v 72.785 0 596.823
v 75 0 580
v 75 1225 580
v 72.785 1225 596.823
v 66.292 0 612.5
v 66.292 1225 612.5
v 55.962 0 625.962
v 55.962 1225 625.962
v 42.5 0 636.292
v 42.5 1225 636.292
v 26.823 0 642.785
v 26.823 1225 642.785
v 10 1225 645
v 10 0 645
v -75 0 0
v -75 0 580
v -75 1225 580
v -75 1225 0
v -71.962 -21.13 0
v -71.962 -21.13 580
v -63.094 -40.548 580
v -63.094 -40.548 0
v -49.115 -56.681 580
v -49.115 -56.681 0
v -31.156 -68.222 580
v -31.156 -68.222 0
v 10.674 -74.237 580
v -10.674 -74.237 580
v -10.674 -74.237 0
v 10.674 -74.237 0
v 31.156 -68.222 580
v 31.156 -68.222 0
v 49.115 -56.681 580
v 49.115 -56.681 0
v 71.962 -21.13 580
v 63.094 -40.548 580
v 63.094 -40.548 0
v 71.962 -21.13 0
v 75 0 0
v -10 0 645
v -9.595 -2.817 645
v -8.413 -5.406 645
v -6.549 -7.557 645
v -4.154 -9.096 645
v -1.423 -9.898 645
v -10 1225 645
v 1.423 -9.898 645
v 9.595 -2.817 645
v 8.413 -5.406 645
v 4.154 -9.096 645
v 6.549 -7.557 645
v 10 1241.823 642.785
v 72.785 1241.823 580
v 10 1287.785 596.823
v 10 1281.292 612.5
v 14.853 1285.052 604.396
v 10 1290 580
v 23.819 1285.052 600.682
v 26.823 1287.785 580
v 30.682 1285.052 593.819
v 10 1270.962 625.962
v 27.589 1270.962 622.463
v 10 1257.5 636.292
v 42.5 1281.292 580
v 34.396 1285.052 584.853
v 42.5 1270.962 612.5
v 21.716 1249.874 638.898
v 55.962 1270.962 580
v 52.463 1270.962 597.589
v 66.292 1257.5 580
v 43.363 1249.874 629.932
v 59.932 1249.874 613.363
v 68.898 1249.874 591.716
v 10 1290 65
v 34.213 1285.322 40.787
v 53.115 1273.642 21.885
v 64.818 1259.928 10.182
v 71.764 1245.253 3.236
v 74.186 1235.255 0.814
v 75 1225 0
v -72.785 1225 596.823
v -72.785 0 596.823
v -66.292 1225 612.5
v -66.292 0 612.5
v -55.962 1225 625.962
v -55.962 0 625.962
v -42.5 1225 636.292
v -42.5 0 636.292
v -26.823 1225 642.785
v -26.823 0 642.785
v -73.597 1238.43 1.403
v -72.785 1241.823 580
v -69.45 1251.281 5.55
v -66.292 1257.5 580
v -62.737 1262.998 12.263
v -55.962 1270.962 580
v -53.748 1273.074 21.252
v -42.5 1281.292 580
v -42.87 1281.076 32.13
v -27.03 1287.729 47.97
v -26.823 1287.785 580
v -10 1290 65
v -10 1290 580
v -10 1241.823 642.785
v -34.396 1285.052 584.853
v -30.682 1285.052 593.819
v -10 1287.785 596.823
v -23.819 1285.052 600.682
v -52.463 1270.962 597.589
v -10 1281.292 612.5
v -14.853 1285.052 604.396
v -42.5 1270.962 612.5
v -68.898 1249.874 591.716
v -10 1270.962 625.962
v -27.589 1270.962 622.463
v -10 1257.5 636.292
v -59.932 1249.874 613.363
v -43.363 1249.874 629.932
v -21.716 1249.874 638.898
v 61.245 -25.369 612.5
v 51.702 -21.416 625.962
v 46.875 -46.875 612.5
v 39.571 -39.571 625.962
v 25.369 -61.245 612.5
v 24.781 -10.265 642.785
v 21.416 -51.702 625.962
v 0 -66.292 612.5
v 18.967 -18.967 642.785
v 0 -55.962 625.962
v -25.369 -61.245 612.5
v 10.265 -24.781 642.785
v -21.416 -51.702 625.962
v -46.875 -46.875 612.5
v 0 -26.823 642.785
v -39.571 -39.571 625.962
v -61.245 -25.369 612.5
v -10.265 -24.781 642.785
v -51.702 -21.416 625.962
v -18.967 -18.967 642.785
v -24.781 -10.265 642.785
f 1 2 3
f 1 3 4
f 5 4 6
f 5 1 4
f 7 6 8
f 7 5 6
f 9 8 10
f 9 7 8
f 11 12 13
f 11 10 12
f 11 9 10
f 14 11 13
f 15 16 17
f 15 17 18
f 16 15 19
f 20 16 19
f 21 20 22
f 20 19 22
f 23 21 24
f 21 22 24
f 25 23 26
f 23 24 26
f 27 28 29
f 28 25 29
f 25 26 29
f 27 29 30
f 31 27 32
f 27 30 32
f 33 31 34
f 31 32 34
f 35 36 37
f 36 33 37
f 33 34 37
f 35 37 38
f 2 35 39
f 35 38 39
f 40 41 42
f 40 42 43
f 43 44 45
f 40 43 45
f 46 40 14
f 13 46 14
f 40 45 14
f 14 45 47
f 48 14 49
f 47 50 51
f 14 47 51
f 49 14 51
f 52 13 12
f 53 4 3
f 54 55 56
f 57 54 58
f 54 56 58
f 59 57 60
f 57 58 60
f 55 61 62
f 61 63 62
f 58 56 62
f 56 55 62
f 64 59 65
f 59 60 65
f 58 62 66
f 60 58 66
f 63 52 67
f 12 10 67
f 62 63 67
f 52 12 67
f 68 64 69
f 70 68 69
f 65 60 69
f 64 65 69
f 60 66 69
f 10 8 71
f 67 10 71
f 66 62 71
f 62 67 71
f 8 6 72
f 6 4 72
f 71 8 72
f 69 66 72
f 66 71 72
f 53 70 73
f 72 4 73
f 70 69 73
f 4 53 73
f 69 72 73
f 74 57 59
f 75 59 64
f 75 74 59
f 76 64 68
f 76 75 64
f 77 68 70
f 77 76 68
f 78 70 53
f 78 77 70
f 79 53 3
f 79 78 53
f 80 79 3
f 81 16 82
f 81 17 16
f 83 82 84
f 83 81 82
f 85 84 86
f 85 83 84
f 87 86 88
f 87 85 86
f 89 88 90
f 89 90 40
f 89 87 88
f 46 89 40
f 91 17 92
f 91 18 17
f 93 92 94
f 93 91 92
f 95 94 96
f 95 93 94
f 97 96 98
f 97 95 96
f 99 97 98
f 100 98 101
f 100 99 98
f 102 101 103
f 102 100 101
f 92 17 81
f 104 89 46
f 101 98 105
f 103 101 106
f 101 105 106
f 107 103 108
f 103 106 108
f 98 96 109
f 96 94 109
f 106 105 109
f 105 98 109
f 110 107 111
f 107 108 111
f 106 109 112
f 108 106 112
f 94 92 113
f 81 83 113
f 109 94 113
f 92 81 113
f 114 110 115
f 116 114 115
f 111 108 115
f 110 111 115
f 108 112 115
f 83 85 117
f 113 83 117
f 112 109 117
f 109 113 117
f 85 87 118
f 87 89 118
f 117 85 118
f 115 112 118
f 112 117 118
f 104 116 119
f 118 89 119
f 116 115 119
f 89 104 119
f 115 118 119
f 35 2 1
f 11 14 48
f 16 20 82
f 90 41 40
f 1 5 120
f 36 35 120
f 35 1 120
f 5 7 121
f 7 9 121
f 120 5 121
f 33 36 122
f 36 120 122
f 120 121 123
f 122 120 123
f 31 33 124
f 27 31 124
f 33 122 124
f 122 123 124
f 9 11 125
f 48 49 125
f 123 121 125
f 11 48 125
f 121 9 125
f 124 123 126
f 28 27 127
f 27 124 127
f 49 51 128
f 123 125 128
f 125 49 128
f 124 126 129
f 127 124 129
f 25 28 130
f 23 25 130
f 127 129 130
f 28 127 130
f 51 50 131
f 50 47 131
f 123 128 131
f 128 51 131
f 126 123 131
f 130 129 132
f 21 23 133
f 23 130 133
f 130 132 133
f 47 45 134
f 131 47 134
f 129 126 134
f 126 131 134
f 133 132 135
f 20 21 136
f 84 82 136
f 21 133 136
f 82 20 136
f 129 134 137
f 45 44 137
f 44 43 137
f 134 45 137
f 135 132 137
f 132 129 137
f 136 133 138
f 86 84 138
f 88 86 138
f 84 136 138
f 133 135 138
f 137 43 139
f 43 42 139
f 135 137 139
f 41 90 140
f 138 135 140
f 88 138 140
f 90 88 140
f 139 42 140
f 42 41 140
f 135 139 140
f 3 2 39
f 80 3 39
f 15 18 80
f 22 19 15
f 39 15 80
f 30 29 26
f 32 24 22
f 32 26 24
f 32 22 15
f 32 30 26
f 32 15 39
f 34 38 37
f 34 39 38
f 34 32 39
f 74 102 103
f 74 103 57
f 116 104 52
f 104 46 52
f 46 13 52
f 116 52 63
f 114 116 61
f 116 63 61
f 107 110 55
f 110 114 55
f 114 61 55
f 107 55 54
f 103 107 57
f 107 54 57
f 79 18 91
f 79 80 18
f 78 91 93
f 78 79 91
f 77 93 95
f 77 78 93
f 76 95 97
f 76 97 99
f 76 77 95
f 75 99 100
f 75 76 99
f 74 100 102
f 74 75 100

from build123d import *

# Parameters (mm, degrees)
SKETCH1_R           = 75
BOSS_EXTRUDE1_DEPTH = 645
SKETCH2_W           = 150
SKETCH2_H           = 645
BOSS_EXTRUDE2_DEPTH = 1290
FILLET1_R           = 65


with BuildPart() as part:
    # Sketch1 → Boss-Extrude1 (new body)
    with BuildSketch(Plane.XY):
        with Locations(Location((0, 0, 0), (0, 0, 180))):
            Circle(SKETCH1_R)
    extrude(amount=BOSS_EXTRUDE1_DEPTH)

    # Sketch2 → Boss-Extrude2 (add)
    with BuildSketch(Plane(origin=(0, 0, 0), x_dir=(1, 0, 0), z_dir=(0, 1, 0))):
        with Locations((0, -322.5)):
            Rectangle(SKETCH2_W, SKETCH2_H)
    extrude(amount=BOSS_EXTRUDE2_DEPTH)

    # Fillet1
    fillet1_edges = [part.edges().sort_by_distance(p)[0] for p in [
        (-75, 645, 645),
        (75, 645, 645),
        (-75, 1290, 322.5),
        (0, 1290, 645),
        (75, 1290, 322.5),
        (0, 1290, 0),
        (0, -75, 645),
    ]]
    fillet(fillet1_edges, radius=FILLET1_R)


solid = part.part
